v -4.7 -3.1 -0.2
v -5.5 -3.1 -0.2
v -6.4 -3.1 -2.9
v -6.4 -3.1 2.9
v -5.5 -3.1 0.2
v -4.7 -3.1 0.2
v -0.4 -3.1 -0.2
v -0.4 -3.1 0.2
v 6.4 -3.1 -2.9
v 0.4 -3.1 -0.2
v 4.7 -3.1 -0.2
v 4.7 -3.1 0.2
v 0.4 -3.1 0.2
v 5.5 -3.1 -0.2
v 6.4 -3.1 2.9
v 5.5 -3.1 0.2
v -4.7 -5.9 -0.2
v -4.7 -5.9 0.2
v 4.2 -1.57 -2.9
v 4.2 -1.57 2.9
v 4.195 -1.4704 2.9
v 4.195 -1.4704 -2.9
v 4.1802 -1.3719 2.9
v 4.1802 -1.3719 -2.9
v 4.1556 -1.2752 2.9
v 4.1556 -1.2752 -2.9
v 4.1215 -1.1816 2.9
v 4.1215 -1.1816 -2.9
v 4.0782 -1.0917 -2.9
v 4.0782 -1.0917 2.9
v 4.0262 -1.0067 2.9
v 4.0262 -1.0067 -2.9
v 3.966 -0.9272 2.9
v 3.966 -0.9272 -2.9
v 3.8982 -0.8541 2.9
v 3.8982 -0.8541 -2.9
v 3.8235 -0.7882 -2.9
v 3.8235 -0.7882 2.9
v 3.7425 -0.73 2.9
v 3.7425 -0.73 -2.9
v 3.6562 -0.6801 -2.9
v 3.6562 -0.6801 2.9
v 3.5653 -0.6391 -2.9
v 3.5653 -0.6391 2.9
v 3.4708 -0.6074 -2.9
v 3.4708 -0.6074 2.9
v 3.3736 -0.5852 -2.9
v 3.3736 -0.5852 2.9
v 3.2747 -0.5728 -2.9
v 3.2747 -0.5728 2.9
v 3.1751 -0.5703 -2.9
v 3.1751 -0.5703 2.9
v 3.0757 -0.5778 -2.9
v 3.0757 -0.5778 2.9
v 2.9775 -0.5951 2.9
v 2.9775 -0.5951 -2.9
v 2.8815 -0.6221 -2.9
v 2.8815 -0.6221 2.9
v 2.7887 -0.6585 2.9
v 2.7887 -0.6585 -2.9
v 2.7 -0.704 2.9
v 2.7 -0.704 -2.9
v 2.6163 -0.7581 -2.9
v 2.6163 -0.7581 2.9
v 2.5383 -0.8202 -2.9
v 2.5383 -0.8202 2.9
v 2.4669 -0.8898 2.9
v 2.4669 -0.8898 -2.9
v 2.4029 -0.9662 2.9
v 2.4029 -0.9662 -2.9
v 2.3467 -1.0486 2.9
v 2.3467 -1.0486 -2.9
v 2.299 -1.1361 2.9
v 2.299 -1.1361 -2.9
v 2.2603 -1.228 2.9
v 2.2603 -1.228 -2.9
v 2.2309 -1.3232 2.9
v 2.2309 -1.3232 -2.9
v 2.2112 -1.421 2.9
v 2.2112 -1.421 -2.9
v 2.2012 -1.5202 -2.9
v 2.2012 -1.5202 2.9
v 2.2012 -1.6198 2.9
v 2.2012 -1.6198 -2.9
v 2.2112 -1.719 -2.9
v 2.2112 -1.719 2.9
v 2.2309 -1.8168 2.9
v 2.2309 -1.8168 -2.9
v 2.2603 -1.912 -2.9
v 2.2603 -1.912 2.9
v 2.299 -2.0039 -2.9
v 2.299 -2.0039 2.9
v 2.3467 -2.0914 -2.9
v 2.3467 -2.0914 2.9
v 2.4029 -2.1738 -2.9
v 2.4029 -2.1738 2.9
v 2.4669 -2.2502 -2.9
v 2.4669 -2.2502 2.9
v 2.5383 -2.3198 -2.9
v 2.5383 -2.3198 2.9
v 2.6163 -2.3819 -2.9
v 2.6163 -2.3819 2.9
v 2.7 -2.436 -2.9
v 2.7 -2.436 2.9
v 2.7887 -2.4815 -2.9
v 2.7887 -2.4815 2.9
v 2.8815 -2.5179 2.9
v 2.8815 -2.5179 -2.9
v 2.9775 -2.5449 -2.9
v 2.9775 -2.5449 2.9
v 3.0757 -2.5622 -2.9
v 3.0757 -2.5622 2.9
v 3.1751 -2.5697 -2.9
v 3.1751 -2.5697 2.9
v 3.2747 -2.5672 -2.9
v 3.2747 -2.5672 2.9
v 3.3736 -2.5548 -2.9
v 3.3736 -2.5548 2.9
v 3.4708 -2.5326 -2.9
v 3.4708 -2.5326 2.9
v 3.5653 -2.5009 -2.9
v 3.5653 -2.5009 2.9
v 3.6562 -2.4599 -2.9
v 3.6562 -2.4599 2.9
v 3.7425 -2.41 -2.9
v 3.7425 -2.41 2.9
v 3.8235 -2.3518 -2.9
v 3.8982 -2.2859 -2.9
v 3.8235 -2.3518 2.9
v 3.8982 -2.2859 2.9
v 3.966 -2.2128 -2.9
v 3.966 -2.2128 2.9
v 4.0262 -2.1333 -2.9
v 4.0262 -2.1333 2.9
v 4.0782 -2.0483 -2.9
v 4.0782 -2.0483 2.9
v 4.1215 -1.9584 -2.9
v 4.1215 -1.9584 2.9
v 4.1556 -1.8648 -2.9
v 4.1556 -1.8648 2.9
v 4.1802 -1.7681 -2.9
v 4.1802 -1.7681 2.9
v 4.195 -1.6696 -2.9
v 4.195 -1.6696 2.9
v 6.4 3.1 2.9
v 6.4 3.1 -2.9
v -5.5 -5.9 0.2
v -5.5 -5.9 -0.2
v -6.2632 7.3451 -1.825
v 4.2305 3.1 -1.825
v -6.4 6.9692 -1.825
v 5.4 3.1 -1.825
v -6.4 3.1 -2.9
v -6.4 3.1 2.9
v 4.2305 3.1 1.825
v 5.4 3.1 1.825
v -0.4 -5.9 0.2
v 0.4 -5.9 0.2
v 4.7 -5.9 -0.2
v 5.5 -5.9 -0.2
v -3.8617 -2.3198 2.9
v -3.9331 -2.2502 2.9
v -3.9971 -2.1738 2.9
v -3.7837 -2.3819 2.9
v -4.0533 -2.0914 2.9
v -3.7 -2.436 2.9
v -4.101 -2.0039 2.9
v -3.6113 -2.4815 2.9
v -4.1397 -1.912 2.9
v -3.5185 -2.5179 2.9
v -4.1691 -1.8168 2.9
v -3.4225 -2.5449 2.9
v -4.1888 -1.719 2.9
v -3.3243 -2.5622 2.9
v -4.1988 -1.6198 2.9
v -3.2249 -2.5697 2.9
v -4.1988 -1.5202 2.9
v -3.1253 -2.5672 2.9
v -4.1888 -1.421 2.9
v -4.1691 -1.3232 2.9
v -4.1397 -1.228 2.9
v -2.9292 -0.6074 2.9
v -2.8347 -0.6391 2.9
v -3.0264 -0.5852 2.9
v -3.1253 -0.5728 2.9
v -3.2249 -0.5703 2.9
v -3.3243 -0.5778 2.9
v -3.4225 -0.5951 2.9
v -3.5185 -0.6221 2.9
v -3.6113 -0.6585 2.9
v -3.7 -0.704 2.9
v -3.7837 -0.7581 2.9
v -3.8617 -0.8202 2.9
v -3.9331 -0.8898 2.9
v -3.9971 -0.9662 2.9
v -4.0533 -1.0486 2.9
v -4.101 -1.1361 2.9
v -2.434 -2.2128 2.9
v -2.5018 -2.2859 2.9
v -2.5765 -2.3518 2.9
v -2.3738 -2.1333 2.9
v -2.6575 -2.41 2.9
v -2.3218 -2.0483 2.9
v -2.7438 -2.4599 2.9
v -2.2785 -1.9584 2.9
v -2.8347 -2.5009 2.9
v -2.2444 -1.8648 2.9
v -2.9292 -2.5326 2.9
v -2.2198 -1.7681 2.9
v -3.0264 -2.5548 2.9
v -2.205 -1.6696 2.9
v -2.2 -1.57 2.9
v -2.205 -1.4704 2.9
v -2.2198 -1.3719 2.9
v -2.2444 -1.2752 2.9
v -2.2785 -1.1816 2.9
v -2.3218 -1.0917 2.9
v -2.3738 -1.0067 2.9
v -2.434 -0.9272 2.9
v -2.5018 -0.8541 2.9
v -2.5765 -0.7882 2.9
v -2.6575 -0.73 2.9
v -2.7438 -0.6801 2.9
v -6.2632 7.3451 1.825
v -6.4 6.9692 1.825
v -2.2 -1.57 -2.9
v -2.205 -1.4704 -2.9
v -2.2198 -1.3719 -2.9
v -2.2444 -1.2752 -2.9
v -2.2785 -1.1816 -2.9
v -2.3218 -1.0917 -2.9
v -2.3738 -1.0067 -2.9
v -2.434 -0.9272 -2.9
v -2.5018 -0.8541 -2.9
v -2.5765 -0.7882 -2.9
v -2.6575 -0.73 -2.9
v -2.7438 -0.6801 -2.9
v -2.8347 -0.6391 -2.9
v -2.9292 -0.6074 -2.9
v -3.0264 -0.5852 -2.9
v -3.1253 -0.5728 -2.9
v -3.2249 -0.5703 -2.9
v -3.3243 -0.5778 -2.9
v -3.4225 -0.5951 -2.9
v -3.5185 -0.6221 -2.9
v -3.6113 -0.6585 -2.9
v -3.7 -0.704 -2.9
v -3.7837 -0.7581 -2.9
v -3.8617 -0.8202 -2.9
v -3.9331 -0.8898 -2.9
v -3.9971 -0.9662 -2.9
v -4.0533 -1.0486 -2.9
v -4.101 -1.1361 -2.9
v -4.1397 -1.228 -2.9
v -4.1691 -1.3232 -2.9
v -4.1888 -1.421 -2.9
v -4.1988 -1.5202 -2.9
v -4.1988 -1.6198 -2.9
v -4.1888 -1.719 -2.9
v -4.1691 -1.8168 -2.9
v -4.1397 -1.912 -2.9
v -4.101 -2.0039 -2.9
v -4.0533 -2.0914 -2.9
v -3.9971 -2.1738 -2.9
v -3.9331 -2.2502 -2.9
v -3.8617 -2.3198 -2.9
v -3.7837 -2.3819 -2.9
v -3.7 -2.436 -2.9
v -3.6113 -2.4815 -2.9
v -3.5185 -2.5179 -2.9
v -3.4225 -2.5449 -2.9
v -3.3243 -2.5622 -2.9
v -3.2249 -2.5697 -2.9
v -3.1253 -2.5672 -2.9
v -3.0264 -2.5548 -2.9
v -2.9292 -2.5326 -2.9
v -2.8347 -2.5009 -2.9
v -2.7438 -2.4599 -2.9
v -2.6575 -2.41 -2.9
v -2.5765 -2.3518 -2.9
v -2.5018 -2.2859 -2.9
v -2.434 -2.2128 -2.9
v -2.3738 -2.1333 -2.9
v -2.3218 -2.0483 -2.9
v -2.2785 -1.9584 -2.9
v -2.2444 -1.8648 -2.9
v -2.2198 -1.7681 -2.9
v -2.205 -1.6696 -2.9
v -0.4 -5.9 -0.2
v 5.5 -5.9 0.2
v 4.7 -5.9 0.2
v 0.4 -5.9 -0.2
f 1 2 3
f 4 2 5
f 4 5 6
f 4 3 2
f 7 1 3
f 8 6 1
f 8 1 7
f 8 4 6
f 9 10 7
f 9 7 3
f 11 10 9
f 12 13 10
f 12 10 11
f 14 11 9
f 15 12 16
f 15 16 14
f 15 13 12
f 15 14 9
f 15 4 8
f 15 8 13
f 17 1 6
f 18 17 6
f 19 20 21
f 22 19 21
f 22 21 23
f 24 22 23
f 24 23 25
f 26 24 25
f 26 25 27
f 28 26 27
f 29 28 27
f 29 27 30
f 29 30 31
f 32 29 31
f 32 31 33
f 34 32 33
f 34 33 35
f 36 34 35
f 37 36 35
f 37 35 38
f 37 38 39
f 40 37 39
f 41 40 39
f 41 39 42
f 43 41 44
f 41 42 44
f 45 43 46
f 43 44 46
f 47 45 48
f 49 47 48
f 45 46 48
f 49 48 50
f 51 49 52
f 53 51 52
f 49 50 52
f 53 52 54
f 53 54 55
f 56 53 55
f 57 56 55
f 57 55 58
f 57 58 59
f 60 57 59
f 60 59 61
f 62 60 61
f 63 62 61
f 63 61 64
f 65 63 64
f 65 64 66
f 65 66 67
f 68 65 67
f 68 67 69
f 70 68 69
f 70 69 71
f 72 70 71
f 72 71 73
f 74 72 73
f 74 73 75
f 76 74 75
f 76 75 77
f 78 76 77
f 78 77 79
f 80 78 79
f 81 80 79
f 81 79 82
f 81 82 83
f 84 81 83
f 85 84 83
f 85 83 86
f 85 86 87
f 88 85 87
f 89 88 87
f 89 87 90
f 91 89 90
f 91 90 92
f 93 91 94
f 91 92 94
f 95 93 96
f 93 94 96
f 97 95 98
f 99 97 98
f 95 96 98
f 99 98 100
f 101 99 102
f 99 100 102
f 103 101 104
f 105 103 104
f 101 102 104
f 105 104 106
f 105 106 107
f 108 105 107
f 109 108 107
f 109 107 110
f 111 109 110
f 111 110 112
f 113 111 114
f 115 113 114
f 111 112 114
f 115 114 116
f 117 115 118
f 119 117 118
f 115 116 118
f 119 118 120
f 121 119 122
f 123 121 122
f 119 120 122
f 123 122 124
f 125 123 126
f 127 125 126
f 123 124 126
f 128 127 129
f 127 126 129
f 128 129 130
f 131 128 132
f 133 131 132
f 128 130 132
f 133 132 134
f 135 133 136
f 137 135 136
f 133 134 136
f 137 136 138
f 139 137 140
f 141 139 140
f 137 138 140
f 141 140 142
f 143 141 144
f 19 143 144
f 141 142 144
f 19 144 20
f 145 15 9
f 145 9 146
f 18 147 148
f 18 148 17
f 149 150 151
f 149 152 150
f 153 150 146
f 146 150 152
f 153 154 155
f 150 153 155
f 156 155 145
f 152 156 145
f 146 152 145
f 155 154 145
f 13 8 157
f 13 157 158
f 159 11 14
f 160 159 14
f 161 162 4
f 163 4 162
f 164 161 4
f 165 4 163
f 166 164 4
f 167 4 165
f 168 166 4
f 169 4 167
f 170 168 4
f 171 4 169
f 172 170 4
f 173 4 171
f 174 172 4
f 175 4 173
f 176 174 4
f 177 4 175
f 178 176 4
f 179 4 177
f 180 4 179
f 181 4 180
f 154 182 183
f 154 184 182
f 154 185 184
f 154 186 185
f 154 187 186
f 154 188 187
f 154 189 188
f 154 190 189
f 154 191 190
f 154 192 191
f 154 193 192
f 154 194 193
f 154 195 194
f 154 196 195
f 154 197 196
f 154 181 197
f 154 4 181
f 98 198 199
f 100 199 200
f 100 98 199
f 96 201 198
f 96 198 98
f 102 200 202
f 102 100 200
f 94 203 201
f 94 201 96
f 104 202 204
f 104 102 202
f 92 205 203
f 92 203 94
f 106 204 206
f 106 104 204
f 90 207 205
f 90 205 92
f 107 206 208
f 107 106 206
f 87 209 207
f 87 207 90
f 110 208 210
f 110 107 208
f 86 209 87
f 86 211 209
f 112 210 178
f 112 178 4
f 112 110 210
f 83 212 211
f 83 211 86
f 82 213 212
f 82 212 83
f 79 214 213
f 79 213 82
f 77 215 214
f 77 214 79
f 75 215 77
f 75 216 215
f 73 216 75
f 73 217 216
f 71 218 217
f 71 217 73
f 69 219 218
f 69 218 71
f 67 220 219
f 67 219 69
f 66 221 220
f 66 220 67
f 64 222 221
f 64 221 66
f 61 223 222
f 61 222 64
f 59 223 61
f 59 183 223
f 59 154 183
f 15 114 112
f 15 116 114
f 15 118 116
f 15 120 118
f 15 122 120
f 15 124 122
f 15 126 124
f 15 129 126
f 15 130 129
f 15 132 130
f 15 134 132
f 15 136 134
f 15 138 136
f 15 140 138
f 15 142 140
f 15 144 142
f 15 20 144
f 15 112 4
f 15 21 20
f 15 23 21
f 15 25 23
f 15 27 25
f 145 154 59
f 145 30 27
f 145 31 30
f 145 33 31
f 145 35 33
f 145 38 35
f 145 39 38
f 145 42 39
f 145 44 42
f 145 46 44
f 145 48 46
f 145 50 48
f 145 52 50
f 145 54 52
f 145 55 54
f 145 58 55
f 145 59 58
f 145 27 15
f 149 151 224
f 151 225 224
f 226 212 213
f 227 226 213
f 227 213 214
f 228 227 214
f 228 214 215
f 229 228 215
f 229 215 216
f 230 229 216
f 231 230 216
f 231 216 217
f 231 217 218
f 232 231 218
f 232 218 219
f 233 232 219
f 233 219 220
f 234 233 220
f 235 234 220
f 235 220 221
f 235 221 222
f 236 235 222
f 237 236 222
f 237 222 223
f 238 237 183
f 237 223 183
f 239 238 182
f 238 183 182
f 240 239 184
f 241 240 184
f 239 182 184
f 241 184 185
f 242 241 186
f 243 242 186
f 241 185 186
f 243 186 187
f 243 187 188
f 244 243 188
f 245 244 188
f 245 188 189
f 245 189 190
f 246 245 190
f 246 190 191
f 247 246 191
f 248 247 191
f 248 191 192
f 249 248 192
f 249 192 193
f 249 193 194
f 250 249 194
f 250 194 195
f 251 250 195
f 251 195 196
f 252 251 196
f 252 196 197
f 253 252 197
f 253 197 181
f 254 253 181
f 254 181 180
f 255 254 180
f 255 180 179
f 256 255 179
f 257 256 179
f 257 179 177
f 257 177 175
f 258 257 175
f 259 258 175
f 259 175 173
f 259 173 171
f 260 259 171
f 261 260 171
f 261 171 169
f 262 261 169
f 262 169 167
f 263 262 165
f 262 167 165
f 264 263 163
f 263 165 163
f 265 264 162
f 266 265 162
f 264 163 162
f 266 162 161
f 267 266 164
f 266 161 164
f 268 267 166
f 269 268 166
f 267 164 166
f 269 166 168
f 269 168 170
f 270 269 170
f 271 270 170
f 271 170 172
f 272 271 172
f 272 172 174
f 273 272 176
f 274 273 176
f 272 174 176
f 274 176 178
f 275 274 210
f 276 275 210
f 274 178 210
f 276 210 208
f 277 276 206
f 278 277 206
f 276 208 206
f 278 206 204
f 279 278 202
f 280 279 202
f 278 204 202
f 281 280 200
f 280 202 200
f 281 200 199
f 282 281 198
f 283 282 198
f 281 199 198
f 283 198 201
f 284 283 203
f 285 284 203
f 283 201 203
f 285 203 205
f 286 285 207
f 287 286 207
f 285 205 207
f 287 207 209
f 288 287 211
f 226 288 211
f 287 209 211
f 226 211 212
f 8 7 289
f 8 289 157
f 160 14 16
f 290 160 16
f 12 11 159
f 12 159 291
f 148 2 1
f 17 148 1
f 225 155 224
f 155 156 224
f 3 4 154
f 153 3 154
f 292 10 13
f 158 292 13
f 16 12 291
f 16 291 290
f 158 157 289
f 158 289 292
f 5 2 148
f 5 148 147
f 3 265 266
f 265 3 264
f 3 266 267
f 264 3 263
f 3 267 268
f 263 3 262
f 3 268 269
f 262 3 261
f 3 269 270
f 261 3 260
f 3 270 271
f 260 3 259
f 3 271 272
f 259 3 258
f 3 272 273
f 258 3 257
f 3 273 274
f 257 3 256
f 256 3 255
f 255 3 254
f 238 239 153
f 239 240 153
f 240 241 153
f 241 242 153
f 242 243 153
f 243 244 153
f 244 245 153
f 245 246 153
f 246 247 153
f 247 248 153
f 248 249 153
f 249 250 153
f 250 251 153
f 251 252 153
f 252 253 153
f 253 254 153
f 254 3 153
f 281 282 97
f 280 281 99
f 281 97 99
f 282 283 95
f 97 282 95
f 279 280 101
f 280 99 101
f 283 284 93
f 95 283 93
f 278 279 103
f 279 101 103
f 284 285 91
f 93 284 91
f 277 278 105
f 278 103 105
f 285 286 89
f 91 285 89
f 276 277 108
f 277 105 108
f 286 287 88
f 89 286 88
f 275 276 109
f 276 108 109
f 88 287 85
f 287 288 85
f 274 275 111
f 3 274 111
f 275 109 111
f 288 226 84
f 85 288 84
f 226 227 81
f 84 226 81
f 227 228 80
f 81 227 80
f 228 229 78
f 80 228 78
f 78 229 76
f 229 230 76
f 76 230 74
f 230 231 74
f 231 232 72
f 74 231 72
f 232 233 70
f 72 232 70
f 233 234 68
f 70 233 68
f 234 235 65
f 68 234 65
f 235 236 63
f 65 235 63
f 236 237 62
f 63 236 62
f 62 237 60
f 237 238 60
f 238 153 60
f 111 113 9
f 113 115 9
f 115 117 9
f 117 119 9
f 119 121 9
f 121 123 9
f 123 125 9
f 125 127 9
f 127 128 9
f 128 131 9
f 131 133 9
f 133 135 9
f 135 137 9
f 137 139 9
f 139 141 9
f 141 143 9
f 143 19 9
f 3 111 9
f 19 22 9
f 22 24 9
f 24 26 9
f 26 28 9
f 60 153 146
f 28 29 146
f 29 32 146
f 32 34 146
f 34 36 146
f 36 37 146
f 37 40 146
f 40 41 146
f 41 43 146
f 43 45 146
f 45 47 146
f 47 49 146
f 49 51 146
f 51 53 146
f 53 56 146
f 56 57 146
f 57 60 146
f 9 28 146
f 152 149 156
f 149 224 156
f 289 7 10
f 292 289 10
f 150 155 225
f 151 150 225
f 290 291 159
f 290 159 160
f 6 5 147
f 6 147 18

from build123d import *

# Parameters (mm, degrees)
SKETCH_W     = 12.8
SKETCH_H     = 6.2
PAD_DEPTH    = 2.9
SKETCH001_W  = 0.8
SKETCH001_H  = 0.4
PAD001_DEPTH = 2.8
PAD002_DEPTH = 1.825
SKETCH003_R  = 1
POCKET_DEPTH = 5.801


with BuildPart() as part:
    # Sketch → Pad (new body, symmetric)
    with BuildSketch(Plane.XY):
        Rectangle(SKETCH_W, SKETCH_H)
    extrude(amount=PAD_DEPTH, both=True)

    # Sketch001 (on Face3 of Pad) → Pad001 (join)
    with BuildSketch(Plane.XZ.offset(3.1)):
        with Locations((-5.1, 0)):
            Rectangle(SKETCH001_W, SKETCH001_H)
        Rectangle(SKETCH001_W, SKETCH001_H)
        with Locations((5.1, 0)):
            Rectangle(SKETCH001_W, SKETCH001_H)
    extrude(amount=PAD001_DEPTH)

    # Sketch002 → Pad002 (join, symmetric)
    with BuildSketch(Plane.XY):
        Polygon((4.230478, 3.1), (-6.4, 6.969178), (-6.263192, 7.345055), (5.4, 3.1), align=None)
    extrude(amount=PAD002_DEPTH, both=True)

    # Sketch003 (on Face4 of Pad002) → Pocket (cut, through all)
    with BuildSketch(Plane.XY.offset(2.9)):
        with Locations((-3.2, -1.57)):
            Circle(SKETCH003_R)
        with Locations((3.2, -1.57)):
            Circle(SKETCH003_R)
    extrude(amount=-POCKET_DEPTH, mode=Mode.SUBTRACT)


solid = part.part
